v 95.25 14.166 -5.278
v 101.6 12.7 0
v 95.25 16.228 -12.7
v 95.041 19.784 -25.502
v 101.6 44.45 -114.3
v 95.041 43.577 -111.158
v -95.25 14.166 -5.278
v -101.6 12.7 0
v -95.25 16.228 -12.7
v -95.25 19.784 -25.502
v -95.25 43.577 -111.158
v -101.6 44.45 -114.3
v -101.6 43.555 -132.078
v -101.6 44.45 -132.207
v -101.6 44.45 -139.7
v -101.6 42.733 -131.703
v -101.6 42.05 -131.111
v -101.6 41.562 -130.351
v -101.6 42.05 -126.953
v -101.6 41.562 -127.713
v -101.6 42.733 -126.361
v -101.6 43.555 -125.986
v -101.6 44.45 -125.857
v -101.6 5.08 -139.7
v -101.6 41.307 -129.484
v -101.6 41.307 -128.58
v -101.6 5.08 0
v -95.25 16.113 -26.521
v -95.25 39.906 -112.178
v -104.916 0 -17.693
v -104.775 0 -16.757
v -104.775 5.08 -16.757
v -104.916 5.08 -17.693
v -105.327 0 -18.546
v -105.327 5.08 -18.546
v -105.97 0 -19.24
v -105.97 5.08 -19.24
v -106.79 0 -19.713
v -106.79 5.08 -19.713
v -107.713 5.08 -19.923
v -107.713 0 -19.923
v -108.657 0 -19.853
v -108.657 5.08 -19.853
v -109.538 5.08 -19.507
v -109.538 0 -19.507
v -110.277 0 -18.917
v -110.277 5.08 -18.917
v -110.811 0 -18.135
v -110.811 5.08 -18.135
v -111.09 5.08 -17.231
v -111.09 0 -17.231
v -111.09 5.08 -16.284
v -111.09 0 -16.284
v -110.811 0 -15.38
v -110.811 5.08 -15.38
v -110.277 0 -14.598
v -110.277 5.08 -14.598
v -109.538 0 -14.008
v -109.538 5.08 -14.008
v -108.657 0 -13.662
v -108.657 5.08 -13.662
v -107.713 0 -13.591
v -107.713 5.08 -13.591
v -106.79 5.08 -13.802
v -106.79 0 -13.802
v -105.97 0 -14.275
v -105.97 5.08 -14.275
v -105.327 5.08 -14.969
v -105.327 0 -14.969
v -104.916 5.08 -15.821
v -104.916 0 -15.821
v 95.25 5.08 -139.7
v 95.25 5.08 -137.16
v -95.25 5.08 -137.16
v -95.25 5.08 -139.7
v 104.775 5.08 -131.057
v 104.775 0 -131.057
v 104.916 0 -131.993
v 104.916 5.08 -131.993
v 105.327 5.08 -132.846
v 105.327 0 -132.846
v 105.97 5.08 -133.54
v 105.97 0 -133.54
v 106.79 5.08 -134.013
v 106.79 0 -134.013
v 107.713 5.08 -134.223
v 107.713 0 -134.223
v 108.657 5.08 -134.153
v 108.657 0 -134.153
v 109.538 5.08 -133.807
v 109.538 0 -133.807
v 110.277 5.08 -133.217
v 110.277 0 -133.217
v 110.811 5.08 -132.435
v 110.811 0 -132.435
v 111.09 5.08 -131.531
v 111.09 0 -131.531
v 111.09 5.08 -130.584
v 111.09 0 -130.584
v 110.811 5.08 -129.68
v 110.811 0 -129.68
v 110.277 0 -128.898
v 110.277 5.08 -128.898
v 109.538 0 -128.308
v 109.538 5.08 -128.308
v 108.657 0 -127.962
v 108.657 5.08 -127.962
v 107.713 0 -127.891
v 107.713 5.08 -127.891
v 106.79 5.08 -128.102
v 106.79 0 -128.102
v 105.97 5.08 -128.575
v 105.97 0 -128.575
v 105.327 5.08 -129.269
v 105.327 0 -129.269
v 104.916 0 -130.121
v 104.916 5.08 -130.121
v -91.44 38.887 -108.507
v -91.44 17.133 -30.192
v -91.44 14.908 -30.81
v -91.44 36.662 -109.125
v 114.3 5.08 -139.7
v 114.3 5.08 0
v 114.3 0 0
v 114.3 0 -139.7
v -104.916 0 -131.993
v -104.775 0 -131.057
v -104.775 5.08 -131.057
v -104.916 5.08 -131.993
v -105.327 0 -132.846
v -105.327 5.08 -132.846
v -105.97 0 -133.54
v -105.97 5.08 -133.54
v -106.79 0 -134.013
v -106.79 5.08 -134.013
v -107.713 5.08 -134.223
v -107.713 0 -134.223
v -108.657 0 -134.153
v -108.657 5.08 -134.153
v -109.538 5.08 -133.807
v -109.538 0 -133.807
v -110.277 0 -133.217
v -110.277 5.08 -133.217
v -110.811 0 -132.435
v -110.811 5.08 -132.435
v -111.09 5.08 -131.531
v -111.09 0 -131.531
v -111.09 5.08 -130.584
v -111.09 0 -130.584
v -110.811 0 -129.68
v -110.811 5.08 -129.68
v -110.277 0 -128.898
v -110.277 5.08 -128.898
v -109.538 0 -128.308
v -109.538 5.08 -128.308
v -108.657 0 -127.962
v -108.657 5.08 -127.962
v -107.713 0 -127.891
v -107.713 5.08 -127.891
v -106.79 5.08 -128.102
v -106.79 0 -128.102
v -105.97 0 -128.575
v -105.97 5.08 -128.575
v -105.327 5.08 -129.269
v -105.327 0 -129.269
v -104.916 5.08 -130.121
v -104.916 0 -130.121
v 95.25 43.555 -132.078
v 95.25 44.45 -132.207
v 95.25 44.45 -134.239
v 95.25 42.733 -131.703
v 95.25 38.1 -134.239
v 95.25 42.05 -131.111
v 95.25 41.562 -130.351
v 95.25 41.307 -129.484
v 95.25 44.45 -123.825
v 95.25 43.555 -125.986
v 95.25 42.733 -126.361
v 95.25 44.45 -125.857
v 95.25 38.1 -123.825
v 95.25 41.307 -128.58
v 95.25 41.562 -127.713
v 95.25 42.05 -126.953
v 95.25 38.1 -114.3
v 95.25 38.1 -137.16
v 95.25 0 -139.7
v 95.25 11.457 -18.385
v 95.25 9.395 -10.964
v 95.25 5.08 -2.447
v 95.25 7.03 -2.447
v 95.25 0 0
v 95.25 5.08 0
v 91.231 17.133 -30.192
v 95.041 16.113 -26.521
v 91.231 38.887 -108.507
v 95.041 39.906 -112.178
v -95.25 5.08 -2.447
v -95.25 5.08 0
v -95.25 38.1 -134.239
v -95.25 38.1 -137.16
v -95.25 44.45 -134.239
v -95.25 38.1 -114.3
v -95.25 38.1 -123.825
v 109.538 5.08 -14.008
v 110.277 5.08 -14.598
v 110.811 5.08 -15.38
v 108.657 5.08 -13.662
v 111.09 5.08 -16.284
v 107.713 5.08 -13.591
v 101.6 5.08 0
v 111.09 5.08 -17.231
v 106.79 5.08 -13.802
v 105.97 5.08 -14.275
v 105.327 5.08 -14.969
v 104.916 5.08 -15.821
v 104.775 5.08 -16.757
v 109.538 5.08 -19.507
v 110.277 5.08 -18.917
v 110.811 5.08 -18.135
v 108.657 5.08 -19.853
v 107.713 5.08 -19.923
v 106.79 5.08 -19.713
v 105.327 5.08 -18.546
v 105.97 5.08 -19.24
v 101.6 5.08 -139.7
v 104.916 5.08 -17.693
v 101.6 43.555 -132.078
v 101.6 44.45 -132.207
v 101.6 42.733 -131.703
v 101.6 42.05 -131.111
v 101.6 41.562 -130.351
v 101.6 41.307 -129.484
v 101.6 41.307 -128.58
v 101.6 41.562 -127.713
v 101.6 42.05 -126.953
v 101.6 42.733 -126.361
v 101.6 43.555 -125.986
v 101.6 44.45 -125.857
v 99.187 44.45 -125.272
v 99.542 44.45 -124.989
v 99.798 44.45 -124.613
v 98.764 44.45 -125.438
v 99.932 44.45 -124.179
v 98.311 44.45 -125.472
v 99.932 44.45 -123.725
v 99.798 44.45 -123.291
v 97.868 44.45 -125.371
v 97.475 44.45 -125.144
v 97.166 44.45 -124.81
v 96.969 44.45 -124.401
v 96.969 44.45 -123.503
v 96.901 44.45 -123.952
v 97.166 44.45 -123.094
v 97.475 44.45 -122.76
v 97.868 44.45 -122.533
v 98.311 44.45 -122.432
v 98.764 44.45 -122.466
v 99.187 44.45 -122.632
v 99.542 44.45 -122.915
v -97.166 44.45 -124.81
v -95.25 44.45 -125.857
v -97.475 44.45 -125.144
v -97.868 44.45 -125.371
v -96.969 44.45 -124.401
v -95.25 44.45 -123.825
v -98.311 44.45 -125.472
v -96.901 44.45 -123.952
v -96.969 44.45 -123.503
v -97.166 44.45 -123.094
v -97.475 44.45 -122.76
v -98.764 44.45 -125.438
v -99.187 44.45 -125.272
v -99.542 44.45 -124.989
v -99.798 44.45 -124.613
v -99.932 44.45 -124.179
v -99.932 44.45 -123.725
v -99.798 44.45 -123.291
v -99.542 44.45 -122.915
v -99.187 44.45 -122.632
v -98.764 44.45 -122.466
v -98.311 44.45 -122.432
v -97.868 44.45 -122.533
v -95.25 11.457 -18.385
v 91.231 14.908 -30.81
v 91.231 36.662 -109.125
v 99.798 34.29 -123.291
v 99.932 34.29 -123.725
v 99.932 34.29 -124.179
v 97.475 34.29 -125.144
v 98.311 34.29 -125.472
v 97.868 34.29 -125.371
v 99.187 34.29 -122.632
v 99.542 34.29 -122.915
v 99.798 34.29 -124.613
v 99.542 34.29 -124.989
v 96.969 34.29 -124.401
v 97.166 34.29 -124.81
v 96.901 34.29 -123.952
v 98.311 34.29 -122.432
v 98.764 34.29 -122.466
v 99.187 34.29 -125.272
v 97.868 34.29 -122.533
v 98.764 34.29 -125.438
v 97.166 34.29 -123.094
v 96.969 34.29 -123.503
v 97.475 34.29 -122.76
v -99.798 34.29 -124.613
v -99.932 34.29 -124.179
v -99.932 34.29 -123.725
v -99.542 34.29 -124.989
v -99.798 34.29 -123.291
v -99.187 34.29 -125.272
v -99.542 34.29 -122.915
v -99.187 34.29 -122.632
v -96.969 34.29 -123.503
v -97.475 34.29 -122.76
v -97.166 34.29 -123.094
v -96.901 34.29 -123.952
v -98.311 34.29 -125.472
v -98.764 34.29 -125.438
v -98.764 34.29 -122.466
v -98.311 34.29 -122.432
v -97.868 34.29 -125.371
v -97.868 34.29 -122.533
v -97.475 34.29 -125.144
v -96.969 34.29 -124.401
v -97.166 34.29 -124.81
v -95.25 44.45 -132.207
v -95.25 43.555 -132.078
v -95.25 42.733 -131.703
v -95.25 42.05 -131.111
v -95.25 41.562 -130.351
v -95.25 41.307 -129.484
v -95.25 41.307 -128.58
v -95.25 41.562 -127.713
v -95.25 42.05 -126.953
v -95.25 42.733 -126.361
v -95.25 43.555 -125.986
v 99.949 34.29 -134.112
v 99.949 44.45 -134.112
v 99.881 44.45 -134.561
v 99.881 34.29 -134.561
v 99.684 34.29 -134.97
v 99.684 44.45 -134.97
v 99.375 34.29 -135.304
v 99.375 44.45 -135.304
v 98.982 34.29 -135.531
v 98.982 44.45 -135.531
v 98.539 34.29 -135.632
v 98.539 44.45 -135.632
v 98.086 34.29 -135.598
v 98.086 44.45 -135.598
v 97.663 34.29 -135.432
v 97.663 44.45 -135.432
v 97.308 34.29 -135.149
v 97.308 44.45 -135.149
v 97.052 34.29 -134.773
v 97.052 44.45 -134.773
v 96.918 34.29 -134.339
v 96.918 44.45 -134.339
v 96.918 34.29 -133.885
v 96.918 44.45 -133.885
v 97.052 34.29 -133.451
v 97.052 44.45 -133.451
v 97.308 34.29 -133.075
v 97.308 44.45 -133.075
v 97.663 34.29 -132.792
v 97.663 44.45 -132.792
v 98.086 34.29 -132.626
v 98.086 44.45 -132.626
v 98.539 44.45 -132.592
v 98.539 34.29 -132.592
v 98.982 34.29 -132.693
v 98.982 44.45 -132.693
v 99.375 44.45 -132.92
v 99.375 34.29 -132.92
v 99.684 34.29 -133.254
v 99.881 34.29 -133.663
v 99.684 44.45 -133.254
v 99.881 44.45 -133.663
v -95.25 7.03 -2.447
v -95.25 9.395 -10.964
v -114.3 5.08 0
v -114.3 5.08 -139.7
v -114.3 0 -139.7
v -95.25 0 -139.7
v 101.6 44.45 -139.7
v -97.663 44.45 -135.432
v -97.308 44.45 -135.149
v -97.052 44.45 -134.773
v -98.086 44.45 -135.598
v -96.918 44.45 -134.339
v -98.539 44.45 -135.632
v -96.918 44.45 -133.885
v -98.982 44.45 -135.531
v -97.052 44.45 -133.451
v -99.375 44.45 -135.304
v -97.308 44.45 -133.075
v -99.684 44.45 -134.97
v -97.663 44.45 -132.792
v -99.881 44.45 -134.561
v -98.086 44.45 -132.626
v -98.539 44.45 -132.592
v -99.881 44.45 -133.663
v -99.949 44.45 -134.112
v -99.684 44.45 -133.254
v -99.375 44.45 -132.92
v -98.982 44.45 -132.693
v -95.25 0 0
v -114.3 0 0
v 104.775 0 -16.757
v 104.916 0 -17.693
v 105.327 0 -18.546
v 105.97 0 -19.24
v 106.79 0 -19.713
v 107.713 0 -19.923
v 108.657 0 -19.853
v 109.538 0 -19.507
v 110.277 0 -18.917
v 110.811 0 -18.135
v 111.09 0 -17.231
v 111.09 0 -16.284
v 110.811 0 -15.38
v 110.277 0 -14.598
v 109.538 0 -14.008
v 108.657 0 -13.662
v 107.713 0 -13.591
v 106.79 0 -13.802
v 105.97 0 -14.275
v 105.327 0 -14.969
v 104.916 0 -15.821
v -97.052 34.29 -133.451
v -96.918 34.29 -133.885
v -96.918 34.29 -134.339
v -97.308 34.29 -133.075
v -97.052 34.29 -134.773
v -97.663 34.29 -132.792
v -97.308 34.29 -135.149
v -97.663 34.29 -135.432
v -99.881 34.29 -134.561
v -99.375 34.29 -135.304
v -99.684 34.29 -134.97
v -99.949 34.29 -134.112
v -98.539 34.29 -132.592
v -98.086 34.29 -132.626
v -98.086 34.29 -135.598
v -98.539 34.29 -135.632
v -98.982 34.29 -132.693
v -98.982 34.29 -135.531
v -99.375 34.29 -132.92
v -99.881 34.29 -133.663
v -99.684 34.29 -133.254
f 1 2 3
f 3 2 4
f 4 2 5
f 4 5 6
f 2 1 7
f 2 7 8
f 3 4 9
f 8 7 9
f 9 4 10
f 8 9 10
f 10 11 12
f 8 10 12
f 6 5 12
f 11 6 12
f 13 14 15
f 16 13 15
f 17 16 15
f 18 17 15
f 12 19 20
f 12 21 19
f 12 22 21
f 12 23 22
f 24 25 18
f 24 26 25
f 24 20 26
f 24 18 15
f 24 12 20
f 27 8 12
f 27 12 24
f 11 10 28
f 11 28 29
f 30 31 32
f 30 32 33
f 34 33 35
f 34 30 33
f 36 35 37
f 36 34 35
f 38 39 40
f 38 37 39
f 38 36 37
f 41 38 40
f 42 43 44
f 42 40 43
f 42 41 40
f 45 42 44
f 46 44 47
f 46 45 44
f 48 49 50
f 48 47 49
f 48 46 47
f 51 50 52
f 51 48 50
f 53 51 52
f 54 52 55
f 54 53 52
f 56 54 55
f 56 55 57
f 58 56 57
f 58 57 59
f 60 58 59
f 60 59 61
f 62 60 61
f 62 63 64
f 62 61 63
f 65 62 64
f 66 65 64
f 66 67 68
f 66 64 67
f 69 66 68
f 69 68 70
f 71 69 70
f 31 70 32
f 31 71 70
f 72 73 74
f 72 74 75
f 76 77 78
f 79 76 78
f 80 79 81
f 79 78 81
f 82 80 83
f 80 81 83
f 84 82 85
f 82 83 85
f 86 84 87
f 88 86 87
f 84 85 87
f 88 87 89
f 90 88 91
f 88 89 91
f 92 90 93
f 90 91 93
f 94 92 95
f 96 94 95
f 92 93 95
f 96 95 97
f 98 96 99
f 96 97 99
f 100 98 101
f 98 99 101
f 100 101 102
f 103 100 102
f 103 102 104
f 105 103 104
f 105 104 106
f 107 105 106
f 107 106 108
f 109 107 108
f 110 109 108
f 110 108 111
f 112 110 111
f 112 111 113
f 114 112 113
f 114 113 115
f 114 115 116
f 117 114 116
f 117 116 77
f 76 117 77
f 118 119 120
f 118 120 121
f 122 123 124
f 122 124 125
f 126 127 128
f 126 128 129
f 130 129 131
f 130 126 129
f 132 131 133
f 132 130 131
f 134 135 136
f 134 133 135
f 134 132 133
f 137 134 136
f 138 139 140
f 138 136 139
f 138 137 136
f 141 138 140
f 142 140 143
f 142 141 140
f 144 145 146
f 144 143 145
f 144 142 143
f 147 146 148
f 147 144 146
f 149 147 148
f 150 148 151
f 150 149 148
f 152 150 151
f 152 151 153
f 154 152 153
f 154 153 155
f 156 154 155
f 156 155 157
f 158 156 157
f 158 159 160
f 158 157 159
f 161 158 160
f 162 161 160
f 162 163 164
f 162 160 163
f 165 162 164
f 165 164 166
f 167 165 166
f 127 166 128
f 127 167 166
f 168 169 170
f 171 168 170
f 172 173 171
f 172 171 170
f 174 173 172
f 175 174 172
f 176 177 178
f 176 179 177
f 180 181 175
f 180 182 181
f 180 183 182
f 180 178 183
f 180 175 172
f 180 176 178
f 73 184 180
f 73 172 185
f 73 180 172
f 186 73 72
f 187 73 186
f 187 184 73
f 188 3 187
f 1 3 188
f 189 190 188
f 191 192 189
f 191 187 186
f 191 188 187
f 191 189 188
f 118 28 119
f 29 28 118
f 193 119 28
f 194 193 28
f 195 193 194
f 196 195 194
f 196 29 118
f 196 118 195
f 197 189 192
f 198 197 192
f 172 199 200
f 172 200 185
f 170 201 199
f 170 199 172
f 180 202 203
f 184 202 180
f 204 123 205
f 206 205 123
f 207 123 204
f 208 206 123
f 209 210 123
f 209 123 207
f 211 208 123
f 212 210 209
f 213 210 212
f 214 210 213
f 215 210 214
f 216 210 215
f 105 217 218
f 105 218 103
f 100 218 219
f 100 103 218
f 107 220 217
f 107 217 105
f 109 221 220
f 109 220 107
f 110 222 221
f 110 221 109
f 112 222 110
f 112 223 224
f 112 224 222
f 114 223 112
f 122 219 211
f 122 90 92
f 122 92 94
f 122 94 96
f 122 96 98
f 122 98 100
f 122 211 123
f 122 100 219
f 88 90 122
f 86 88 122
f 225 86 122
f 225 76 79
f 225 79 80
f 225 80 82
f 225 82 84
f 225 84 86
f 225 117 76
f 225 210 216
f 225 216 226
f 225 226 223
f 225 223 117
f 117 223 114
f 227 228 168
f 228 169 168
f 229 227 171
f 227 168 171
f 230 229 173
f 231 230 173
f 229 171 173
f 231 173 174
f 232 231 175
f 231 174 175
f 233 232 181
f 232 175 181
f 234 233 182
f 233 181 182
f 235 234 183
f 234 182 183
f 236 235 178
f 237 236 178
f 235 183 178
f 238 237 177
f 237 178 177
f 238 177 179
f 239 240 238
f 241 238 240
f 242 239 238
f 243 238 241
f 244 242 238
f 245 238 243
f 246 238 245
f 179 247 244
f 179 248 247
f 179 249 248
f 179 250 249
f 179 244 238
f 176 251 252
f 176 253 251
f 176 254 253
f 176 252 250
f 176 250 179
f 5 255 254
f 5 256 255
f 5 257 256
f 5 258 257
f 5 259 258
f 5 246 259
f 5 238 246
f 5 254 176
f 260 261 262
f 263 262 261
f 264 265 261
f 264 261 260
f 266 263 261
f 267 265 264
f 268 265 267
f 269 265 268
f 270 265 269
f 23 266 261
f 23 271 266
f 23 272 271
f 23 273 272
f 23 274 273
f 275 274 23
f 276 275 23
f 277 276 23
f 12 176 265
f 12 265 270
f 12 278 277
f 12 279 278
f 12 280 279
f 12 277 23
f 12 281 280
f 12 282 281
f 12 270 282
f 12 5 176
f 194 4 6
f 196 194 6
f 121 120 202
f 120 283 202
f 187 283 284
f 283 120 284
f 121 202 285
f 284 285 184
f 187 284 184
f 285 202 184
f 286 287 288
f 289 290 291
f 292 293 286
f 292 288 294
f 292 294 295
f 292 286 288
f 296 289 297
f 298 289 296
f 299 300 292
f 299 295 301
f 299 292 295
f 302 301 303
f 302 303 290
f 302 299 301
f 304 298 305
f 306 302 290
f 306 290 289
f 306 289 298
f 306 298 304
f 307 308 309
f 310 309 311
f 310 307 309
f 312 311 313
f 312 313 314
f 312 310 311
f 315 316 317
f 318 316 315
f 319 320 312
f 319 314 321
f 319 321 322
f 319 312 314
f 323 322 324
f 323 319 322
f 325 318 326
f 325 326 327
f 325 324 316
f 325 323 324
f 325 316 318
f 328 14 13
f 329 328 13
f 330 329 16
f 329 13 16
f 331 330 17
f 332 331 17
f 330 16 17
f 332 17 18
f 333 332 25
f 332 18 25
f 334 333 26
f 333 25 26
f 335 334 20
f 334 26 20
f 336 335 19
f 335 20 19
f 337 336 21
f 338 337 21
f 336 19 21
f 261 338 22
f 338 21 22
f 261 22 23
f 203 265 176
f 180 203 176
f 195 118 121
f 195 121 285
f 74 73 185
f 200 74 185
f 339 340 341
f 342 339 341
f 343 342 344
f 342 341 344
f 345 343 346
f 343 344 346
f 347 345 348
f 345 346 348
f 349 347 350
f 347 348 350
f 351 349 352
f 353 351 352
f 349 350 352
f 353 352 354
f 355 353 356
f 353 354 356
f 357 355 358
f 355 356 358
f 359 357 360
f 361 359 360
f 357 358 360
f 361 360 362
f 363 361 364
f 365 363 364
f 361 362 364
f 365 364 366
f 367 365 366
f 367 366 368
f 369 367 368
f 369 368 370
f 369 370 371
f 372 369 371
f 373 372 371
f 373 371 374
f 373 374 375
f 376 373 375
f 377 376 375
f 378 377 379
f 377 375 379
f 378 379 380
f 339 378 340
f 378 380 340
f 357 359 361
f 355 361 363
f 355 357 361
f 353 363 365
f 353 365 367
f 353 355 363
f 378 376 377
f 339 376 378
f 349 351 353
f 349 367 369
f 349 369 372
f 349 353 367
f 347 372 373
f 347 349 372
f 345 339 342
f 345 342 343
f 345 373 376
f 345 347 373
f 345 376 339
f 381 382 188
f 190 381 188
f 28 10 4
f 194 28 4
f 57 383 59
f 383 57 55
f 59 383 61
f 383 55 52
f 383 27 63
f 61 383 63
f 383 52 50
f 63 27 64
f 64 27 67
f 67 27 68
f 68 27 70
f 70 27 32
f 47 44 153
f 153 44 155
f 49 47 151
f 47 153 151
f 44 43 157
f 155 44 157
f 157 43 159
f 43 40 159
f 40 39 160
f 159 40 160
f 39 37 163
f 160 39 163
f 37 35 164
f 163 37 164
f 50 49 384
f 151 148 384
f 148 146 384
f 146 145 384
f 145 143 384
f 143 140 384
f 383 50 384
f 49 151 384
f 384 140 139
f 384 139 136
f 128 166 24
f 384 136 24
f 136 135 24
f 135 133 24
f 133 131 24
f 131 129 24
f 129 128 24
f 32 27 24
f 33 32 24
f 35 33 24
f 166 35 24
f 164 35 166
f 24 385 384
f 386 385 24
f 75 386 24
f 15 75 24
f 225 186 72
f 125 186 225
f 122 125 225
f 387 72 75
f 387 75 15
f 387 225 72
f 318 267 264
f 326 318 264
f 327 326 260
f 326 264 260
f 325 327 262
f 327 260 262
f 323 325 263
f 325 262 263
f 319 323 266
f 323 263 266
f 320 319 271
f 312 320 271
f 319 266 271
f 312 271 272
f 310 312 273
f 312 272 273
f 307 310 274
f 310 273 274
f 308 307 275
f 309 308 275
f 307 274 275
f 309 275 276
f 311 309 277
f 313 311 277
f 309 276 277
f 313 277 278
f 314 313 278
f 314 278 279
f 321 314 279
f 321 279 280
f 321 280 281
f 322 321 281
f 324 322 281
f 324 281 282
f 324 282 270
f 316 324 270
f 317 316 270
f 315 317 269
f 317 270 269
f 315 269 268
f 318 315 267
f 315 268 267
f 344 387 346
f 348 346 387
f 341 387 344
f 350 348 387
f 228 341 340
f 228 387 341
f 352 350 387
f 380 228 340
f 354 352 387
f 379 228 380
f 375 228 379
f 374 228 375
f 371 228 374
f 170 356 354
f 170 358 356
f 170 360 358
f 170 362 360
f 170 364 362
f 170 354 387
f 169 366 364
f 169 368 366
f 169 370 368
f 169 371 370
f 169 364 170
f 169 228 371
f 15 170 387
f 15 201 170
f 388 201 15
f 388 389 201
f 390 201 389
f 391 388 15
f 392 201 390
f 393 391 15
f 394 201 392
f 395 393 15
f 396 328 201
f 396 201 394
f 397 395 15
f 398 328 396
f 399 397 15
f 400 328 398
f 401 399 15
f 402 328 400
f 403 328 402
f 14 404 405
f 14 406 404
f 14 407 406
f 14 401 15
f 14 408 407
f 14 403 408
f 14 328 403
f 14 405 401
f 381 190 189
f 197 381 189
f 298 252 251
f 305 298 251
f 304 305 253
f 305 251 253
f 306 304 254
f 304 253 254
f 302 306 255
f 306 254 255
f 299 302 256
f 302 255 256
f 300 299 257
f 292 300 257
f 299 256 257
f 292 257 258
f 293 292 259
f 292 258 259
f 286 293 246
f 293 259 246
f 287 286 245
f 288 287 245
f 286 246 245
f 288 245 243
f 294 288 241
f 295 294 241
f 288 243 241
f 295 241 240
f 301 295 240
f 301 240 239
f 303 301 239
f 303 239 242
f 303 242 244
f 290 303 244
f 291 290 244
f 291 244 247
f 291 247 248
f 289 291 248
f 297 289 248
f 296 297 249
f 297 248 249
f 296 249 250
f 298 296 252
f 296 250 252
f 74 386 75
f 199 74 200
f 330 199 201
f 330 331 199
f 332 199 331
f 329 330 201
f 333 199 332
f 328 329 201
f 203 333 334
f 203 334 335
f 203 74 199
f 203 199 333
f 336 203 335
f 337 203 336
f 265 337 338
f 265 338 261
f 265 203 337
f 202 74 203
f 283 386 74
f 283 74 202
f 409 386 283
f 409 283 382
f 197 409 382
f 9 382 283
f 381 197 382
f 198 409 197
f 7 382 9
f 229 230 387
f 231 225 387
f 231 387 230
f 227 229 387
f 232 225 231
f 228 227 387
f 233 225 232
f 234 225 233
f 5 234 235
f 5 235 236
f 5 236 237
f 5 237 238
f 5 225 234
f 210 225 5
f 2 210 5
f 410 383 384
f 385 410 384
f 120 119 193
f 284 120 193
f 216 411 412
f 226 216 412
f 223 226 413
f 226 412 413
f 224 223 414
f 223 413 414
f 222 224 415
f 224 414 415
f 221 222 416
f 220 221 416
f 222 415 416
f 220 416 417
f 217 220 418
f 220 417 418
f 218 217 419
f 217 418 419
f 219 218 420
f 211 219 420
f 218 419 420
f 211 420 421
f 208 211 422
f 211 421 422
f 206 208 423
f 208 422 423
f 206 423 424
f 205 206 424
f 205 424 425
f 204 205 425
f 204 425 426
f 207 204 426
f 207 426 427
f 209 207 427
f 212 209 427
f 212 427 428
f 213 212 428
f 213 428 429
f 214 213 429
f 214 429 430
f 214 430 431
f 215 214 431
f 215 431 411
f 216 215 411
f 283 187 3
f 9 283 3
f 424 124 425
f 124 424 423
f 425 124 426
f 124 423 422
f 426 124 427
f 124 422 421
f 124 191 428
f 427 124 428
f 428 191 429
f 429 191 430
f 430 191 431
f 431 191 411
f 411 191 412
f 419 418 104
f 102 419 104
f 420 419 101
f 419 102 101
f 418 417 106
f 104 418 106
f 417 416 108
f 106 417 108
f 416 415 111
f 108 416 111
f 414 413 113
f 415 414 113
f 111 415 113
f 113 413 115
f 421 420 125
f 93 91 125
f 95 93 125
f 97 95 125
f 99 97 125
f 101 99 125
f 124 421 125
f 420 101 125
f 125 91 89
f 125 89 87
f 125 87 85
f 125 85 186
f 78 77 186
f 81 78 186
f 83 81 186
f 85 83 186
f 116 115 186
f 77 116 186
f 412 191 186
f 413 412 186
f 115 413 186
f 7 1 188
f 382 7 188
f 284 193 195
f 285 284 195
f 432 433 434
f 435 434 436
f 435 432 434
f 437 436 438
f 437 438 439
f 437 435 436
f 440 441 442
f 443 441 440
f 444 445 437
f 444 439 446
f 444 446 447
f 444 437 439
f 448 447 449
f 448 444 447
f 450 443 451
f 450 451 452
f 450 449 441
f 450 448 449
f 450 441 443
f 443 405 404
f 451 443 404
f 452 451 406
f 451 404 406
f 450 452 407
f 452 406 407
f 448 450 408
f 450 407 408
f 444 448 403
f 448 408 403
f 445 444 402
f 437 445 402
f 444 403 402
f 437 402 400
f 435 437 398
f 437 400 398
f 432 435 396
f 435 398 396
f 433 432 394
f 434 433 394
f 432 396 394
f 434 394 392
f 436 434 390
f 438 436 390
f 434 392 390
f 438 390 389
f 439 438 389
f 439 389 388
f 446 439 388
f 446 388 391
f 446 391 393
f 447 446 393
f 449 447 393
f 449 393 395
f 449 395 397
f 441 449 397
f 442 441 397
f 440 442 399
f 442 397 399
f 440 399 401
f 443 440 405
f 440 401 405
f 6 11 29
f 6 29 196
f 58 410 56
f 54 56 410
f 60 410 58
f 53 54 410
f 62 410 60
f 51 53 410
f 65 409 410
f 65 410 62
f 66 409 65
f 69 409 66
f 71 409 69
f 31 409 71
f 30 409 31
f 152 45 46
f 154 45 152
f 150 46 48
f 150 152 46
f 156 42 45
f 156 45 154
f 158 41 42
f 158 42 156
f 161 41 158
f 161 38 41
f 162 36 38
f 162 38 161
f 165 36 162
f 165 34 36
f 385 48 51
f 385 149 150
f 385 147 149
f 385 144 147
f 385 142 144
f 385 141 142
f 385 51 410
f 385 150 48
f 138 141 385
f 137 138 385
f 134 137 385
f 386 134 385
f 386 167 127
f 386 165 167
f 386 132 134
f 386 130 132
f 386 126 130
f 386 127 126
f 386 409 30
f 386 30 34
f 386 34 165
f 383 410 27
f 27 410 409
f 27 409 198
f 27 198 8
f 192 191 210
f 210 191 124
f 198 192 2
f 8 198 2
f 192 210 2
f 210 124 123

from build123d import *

# Parameters (mm, degrees)
CUT_EXTRUDE1_START          = -6.35
CUT_EXTRUDE1_DEPTH          = 190.5
BOSS_EXTRUDE4_REACH         = 233.927
BOSS_EXTRUDE5_DEPTH         = 25.4
SKETCH3_W                   = 2.54
SKETCH3_H                   = 39.37
BOSS_EXTRUDE1_DEPTH         = 95.25
SKETCH11_R                  = 3.175
CUT_EXTRUDE6_DEPTH          = 251.563629798
SKETCH12_R                  = 1.524
CUT_EXTRUDE7_DEPTH          = 10.16
SKETCH5_W                   = 190.291482803
SKETCH5_H                   = 88.9
CUT_EXTRUDE2_DEPTH          = 3.81
SKETCH6_W                   = 182.671482803
SKETCH6_H                   = 81.28
CUT_EXTRUDE3_DEPTH          = 12.7
SKETCH14_W                  = 190.5
SKETCH14_H                  = 10.414
CUT_EXTRUDE8_DEPTH          = 179.366063356
SKETCH15_W                  = 139.7
SKETCH15_H                  = 5.08
BOSS_EXTRUDE6_DEPTH         = 12.7
F_1_4_0_25_DIAMETER_HOLE1_D = 6.35


with BuildPart() as part:
    # Sketch1 → Loft1 section 0
    with BuildSketch(Plane.XY):
        with BuildLine():
            Line((101.6, 0), (101.6, 12.7))
            Line((101.6, 12.7), (-101.6, 12.7))
            Line((-101.6, 12.7), (-101.6, 0))
            Line((-101.6, 0), (-95.25, 0))
            Line((-95.25, 0), (-95.25, 6.35))
            Line((-95.25, 6.35), (95.25, 6.35))
            Line((95.25, 6.35), (95.25, 0))
            Line((95.25, 0), (101.6, 0))
        make_face()
    # Sketch2 → Loft1 section 1
    with BuildSketch(Plane.XY.offset(-114.3)):
        with BuildLine():
            Line((-95.25, 0), (-95.25, 38.1))
            Line((-95.25, 38.1), (95.25, 38.1))
            Line((95.25, 38.1), (95.25, 0))
            Line((95.25, 0), (101.6, 0))
            Line((101.6, 0), (101.6, 44.45))
            Line((101.6, 44.45), (-101.6, 44.45))
            Line((-101.6, 44.45), (-101.6, 0))
            Line((-101.6, 0), (-95.25, 0))
        make_face()
    loft()

    # Sketch4 → Cut-Extrude1 (cut)
    with BuildSketch(Plane(origin=(101.6, 0, 0), x_dir=(0, 0, -1), z_dir=(1, 0, 0)).offset(CUT_EXTRUDE1_START)):
        Polygon((12.7, 32.737292081), (5.278114464, 32.737292081), (5.278114464, 14.166142907), (15.549865586, 5.547120329), (19.654278654, 10.392445124), (12.7, 16.227777778), align=None)
    extrude(amount=-CUT_EXTRUDE1_DEPTH, mode=Mode.SUBTRACT)

    # Sketch7 → Boss-Extrude4 (add, up to next)
    with BuildSketch(Plane.ZY.offset(-95.25), mode=Mode.PRIVATE) as boss_extrude4_sk1:
        Polygon((0, 6.35), (-2.44733549, 7.029815414), (-2.44733549, 5.08), (0, 5.08), align=None)
    boss_extrude4_tool1 = extrude(boss_extrude4_sk1.sketch, amount=BOSS_EXTRUDE4_REACH, mode=Mode.PRIVATE) - part.part
    add(boss_extrude4_tool1.solids().sort_by_distance((95.25, 5.896915, -1.309787))[0])

    # Sketch9 → Boss-Extrude5 (add)
    with BuildSketch(Plane(origin=(0, 0, -114.3), x_dir=(-1, 0, 0), z_dir=(0, 0, -1))):
        Polygon((-95.25, 0), (-101.6, 0), (-101.6, 44.45), (101.6, 44.45), (101.6, 0), (95.25, 0), (95.25, 38.1), (-95.25, 38.1), align=None)
    extrude(amount=BOSS_EXTRUDE5_DEPTH)

    # Sketch3 → Boss-Extrude1 (add, symmetric)
    with BuildSketch(Plane(origin=(0, 0, 0), x_dir=(0, 0, -1), z_dir=(1, 0, 0))):
        with Locations((138.43, 24.765)):
            Rectangle(SKETCH3_W, SKETCH3_H)
    extrude(amount=BOSS_EXTRUDE1_DEPTH, both=True)

    # Sketch11 → Cut-Extrude6 (cut, through all)
    with BuildSketch(Plane.ZY.offset(101.6)):
        with Locations((-129.032, 44.45)):
            Circle(SKETCH11_R)
    extrude(amount=-CUT_EXTRUDE6_DEPTH, mode=Mode.SUBTRACT)

    # Sketch12 → Cut-Extrude7 (cut)
    with BuildSketch(Plane(origin=(0, 44.45, 0), x_dir=(1, 0, 0), z_dir=(0, 1, 0))):
        with Locations(Location((98.425, 123.952, 0), (0, 0, 180))):
            Circle(SKETCH12_R)
        with Locations((98.425, 134.112)):
            Circle(SKETCH12_R)
        with Locations(Location((-98.425, 134.112, 0), (0, 0, 180))):
            Circle(SKETCH12_R)
        with Locations((-98.425, 123.952)):
            Circle(SKETCH12_R)
    extrude(amount=-CUT_EXTRUDE7_DEPTH, mode=Mode.SUBTRACT)

    # Sketch5 → Cut-Extrude2 (cut)
    with BuildSketch(Plane(origin=(0, 11.79025788, 3.275071633), x_dir=(1, 0, 0), z_dir=(0, 0.9635179096299408, 0.2676438637860946))):
        with Locations((-0.104258598, 74.316283438)):
            Rectangle(SKETCH5_W, SKETCH5_H)
    extrude(amount=-CUT_EXTRUDE2_DEPTH, mode=Mode.SUBTRACT)

    # Sketch6 → Cut-Extrude3 (cut)
    with BuildSketch(Plane(origin=(0, 8.119254644, 2.255348512), x_dir=(1, 0, 0), z_dir=(0, 0.9635179096299407, 0.26764386378609456))):
        with Locations((-0.104258599, 74.316283438)):
            Rectangle(SKETCH6_W, SKETCH6_H)
    extrude(amount=-CUT_EXTRUDE3_DEPTH, mode=Mode.SUBTRACT)

    # Sketch14 → Cut-Extrude8 (cut, through all)
    with BuildSketch(Plane(origin=(0, 44.45, 0), x_dir=(1, 0, 0), z_dir=(0, 1, 0))):
        with Locations((0, 129.032)):
            Rectangle(SKETCH14_W, SKETCH14_H)
    extrude(amount=-CUT_EXTRUDE8_DEPTH, mode=Mode.SUBTRACT)

    # Sketch15 → Boss-Extrude6 (add)
    with BuildSketch(Plane(origin=(101.6, 0, 0), x_dir=(0, 0, -1), z_dir=(1, 0, 0))):
        with Locations((69.85, 2.54)):
            Rectangle(SKETCH15_W, SKETCH15_H)
    boss_extrude6 = extrude(amount=BOSS_EXTRUDE6_DEPTH)

    # 1/4 (0.25) Diameter Hole1 (through all)
    with Locations(Plane(origin=(0, 5.08, 0), x_dir=(1, 0, 0), z_dir=(0, 1, 0))):
        with Locations((107.95, 16.757307422), (107.95, 131.057307422)):
            f_1_4_0_25_diameter_hole1 = Hole(F_1_4_0_25_DIAMETER_HOLE1_D / 2)

    # Mirror1: Boss-Extrude6 across plane
    add(boss_extrude6.mirror(Plane(origin=(0, 0, 0), x_dir=(0, 0, 1), z_dir=(1, 0, 0))))

    # Mirror2: 1/4 (0.25) Diameter Hole1 across plane
    add(f_1_4_0_25_diameter_hole1.mirror(Plane(origin=(0, 0, 0), x_dir=(0, 0, 1), z_dir=(1, 0, 0))), mode=Mode.SUBTRACT)


solid = part.part
